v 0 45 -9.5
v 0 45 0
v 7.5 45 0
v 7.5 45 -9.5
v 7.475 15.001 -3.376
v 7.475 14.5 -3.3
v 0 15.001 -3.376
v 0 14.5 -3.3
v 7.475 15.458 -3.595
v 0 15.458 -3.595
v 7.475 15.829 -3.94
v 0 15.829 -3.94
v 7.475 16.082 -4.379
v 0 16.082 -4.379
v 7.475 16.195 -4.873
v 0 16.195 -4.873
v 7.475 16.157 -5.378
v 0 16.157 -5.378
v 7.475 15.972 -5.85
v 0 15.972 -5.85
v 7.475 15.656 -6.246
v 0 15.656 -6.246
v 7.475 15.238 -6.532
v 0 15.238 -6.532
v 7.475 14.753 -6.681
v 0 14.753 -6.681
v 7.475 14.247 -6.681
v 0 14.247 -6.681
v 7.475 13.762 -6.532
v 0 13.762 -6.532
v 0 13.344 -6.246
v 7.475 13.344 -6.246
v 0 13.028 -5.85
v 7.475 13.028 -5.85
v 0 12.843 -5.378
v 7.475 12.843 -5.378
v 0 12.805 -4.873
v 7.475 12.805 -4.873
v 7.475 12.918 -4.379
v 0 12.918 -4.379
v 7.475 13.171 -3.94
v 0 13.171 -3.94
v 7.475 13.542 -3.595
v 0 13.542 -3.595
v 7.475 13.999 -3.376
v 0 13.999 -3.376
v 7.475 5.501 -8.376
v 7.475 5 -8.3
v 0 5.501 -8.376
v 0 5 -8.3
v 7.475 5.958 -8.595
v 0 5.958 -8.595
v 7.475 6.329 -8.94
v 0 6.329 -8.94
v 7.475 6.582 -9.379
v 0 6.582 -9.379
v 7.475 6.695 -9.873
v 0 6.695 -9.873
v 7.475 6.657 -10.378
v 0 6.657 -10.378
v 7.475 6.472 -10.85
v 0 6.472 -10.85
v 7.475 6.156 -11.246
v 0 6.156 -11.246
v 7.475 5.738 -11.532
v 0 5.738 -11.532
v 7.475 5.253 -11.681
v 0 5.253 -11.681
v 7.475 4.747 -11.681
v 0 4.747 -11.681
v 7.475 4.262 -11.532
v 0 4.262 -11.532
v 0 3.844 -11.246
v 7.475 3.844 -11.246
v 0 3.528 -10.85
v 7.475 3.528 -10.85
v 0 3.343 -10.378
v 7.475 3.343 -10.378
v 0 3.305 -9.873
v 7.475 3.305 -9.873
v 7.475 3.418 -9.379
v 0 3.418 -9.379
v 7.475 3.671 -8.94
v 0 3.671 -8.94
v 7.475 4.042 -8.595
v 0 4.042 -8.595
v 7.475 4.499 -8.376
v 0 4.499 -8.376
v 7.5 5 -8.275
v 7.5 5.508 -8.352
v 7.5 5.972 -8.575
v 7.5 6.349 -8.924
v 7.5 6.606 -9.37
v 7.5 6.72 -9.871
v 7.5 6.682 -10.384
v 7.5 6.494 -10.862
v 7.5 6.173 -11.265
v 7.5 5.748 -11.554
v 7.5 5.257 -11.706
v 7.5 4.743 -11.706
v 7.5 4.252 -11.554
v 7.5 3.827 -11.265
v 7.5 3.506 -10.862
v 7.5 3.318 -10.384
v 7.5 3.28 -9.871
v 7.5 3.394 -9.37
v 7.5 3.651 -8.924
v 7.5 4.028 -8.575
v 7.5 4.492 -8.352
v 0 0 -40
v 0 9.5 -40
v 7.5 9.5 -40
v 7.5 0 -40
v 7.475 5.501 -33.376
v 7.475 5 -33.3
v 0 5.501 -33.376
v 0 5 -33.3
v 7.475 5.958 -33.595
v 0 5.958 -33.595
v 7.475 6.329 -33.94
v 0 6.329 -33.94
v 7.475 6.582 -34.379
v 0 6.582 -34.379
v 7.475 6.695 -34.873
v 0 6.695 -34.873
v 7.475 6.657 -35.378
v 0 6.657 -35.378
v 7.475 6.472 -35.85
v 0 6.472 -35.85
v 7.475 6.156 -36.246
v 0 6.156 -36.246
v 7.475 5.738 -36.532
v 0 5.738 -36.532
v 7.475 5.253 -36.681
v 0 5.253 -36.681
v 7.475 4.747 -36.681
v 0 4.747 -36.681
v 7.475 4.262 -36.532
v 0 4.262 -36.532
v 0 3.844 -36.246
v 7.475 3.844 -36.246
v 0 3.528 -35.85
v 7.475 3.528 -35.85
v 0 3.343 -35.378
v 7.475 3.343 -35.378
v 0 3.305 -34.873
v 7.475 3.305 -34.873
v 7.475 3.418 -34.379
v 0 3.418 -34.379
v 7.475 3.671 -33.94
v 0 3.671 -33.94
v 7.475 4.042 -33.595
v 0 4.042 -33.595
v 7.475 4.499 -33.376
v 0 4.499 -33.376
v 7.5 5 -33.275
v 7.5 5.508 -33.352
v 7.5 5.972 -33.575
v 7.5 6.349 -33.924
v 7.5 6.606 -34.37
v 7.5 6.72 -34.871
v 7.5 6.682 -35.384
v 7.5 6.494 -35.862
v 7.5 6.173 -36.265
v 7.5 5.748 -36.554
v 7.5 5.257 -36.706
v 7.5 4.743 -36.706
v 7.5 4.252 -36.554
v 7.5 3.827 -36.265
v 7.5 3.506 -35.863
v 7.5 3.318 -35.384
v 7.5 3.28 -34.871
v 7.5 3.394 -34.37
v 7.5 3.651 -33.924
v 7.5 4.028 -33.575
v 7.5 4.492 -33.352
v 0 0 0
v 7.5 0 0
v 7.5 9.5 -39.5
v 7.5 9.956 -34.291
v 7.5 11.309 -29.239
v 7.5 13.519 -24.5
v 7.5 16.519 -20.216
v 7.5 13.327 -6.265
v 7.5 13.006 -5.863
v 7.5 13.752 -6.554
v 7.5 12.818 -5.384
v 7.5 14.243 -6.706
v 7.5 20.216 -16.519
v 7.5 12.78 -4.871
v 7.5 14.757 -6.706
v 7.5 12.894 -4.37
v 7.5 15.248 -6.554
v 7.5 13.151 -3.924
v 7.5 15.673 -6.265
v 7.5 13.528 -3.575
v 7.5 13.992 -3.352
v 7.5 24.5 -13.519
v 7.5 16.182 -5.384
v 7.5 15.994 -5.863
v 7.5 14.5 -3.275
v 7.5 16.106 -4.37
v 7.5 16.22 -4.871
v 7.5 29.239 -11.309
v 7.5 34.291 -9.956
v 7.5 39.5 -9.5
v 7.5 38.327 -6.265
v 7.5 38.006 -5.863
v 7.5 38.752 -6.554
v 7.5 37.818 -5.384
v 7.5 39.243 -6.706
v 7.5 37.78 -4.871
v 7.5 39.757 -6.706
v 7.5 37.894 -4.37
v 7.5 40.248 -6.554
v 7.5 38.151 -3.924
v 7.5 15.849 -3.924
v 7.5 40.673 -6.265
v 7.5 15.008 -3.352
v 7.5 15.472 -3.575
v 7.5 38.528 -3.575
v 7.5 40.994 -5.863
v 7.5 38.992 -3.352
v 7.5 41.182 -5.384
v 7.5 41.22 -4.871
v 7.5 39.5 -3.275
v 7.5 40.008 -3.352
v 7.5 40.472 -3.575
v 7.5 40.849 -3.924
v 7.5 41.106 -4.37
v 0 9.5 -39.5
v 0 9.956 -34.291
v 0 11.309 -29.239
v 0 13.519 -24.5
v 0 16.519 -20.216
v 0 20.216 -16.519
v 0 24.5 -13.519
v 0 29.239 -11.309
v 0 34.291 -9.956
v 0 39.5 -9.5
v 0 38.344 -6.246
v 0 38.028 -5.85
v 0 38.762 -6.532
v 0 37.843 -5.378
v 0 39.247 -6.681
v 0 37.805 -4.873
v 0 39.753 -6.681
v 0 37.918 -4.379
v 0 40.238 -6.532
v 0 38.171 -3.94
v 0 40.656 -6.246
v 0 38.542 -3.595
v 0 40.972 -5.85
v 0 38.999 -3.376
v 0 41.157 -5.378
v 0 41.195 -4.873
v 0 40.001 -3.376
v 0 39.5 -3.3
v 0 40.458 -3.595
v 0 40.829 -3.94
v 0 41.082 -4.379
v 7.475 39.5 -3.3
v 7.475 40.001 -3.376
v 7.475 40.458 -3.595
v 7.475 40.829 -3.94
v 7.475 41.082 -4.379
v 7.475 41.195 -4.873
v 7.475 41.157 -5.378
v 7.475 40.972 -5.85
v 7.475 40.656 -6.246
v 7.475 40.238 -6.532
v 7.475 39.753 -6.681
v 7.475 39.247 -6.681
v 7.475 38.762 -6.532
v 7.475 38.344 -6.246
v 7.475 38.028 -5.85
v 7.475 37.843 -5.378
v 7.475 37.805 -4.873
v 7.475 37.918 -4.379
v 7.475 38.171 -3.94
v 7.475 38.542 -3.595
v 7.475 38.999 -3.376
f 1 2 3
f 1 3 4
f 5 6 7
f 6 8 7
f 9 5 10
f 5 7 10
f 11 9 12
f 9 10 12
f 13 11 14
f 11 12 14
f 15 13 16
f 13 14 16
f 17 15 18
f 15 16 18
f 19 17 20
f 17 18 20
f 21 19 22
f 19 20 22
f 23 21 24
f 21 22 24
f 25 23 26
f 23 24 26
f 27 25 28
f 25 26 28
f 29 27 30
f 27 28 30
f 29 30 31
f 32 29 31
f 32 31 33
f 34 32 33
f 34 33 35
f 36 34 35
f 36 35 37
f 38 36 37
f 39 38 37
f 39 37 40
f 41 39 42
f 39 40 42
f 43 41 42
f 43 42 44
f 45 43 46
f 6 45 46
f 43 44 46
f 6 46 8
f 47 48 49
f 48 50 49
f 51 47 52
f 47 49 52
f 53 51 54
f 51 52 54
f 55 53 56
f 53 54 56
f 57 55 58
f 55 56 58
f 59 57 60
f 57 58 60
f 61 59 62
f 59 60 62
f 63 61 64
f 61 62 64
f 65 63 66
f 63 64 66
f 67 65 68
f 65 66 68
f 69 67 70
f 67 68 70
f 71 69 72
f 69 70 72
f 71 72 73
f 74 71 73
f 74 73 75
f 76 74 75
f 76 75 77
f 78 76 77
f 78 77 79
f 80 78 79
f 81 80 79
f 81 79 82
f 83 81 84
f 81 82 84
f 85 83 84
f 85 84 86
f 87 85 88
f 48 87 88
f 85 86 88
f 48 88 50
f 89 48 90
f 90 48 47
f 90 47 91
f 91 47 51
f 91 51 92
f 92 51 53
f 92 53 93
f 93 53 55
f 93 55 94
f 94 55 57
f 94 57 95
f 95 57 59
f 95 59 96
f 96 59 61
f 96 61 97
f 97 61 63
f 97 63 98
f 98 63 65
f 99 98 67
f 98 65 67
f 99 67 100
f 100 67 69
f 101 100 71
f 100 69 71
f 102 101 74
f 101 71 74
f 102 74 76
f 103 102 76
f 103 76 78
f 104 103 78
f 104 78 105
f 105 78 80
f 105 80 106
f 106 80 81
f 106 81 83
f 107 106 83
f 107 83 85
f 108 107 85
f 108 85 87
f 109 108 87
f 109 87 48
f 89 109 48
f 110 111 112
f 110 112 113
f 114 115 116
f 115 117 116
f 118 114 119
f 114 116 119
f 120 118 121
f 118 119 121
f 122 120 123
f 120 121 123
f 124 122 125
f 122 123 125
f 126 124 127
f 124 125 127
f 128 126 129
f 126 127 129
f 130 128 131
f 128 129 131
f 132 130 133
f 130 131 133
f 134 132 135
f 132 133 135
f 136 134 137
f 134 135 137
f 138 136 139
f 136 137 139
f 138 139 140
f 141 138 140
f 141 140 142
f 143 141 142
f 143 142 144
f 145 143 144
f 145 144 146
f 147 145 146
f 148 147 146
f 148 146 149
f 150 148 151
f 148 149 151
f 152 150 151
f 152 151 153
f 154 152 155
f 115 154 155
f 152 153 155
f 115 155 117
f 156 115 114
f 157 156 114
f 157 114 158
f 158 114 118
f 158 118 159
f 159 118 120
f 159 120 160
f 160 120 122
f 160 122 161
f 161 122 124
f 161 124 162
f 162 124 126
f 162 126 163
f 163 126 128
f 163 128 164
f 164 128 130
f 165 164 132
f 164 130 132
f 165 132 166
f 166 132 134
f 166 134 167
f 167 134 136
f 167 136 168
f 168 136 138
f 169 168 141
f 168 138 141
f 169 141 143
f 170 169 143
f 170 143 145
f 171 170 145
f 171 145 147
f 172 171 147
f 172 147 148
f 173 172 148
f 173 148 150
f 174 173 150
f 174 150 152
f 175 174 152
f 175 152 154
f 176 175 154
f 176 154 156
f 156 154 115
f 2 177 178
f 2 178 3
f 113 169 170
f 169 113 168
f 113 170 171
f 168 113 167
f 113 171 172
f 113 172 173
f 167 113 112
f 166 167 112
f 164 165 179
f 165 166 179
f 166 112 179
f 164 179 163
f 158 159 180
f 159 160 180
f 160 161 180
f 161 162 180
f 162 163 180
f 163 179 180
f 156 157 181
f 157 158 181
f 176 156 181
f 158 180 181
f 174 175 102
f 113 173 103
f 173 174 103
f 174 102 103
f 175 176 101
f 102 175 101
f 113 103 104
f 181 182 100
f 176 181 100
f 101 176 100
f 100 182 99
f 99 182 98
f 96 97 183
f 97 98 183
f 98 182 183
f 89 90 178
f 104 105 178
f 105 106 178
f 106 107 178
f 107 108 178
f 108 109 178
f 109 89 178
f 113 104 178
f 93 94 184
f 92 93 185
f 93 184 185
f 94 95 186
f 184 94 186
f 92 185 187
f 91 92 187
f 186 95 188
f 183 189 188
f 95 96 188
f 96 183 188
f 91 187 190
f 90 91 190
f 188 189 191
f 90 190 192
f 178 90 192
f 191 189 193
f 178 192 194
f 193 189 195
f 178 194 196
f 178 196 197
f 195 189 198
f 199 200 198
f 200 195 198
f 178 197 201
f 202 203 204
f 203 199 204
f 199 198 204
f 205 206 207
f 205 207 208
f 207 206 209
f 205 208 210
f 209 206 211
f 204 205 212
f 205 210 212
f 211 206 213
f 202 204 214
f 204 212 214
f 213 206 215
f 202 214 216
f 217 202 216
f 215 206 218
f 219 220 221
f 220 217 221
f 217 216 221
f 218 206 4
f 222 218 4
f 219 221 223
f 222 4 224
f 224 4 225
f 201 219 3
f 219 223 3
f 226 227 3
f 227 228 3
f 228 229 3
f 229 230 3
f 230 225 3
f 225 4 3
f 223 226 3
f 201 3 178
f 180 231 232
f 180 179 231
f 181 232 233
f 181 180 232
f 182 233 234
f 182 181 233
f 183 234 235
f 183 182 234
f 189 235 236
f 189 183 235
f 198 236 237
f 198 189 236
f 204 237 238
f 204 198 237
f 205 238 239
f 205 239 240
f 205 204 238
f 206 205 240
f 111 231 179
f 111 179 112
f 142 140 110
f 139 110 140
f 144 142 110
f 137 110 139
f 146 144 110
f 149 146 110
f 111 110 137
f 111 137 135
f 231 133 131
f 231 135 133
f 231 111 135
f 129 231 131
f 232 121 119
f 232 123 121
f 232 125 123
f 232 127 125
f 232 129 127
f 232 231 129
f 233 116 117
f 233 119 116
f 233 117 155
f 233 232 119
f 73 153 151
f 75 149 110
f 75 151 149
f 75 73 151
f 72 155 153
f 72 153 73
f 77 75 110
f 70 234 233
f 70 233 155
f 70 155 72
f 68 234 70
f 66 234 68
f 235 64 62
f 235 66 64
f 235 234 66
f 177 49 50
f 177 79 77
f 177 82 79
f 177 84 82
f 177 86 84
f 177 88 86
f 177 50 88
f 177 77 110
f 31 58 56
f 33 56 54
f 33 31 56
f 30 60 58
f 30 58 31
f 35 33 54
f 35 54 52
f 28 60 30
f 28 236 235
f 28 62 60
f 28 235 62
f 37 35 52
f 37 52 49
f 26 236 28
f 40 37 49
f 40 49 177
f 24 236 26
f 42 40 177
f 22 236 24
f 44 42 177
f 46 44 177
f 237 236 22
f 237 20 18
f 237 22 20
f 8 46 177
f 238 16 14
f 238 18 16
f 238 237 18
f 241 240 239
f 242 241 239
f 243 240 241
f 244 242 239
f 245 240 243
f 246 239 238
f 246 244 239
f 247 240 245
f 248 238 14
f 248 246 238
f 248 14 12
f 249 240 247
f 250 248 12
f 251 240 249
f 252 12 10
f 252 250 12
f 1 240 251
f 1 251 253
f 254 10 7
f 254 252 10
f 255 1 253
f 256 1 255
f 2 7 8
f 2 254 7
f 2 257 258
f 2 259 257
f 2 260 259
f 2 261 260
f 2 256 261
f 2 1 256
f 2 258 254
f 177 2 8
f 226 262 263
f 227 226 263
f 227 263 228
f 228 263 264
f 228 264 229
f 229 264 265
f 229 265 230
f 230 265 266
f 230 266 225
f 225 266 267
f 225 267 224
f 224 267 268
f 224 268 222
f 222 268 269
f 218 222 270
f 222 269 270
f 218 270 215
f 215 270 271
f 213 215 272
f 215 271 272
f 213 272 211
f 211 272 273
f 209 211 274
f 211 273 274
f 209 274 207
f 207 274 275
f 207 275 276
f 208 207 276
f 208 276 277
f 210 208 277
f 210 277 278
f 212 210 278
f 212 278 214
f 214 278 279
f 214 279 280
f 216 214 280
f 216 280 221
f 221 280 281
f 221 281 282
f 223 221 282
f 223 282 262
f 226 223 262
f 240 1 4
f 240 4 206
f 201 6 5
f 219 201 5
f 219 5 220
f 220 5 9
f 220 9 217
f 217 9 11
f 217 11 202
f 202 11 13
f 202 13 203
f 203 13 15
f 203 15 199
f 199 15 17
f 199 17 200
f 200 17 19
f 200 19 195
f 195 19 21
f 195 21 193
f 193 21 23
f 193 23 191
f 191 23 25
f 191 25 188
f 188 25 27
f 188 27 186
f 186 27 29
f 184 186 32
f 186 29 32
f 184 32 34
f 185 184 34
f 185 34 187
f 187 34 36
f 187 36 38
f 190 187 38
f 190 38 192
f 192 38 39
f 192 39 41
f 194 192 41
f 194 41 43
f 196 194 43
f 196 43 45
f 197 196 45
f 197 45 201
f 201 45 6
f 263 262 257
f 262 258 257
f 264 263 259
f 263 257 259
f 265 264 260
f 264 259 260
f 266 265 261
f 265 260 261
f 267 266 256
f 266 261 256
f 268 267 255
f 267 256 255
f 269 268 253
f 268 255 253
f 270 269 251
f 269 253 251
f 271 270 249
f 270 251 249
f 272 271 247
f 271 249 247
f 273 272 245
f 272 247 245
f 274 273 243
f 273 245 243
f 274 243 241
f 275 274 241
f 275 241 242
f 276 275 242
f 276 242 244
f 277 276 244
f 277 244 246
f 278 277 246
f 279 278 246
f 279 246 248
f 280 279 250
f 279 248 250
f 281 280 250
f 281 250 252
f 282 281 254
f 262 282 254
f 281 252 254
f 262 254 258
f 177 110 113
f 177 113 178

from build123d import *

# Parameters (mm, degrees)
BOSS_EXTRUDE1_DEPTH            = 7.5
M3_CLEARANCE_HOLE1_D           = 3.4
M3_CLEARANCE_HOLE1_CSINK_D     = 3.45
M3_CLEARANCE_HOLE1_CSINK_ANGLE = 90
FILLET1_R                      = 30


with BuildPart() as part:
    # Sketch1 → Boss-Extrude1 (new body)
    with BuildSketch(Plane(origin=(0, 0, 0), x_dir=(0, 0, -1), z_dir=(1, 0, 0))):
        Polygon((0, 0), (0, 45), (9.5, 45), (9.5, 9.5), (40, 9.5), (40, 0), align=None)
    extrude(amount=BOSS_EXTRUDE1_DEPTH)

    # M3 Clearance Hole1 (through all)
    with Locations(Plane(origin=(7.5, 0, 0), x_dir=(0, 0, -1), z_dir=(1, 0, 0))):
        with Locations((35, 5), (10, 5), (5, 39.5), (5, 14.5)):
            CounterSinkHole(M3_CLEARANCE_HOLE1_D / 2, M3_CLEARANCE_HOLE1_CSINK_D / 2, counter_sink_angle=M3_CLEARANCE_HOLE1_CSINK_ANGLE)

    # Fillet1
    fillet1_edges = [part.edges().sort_by_distance(p)[0] for p in [
        (3.75, 9.5, -9.5),
    ]]
    fillet(fillet1_edges, radius=FILLET1_R)


solid = part.part
